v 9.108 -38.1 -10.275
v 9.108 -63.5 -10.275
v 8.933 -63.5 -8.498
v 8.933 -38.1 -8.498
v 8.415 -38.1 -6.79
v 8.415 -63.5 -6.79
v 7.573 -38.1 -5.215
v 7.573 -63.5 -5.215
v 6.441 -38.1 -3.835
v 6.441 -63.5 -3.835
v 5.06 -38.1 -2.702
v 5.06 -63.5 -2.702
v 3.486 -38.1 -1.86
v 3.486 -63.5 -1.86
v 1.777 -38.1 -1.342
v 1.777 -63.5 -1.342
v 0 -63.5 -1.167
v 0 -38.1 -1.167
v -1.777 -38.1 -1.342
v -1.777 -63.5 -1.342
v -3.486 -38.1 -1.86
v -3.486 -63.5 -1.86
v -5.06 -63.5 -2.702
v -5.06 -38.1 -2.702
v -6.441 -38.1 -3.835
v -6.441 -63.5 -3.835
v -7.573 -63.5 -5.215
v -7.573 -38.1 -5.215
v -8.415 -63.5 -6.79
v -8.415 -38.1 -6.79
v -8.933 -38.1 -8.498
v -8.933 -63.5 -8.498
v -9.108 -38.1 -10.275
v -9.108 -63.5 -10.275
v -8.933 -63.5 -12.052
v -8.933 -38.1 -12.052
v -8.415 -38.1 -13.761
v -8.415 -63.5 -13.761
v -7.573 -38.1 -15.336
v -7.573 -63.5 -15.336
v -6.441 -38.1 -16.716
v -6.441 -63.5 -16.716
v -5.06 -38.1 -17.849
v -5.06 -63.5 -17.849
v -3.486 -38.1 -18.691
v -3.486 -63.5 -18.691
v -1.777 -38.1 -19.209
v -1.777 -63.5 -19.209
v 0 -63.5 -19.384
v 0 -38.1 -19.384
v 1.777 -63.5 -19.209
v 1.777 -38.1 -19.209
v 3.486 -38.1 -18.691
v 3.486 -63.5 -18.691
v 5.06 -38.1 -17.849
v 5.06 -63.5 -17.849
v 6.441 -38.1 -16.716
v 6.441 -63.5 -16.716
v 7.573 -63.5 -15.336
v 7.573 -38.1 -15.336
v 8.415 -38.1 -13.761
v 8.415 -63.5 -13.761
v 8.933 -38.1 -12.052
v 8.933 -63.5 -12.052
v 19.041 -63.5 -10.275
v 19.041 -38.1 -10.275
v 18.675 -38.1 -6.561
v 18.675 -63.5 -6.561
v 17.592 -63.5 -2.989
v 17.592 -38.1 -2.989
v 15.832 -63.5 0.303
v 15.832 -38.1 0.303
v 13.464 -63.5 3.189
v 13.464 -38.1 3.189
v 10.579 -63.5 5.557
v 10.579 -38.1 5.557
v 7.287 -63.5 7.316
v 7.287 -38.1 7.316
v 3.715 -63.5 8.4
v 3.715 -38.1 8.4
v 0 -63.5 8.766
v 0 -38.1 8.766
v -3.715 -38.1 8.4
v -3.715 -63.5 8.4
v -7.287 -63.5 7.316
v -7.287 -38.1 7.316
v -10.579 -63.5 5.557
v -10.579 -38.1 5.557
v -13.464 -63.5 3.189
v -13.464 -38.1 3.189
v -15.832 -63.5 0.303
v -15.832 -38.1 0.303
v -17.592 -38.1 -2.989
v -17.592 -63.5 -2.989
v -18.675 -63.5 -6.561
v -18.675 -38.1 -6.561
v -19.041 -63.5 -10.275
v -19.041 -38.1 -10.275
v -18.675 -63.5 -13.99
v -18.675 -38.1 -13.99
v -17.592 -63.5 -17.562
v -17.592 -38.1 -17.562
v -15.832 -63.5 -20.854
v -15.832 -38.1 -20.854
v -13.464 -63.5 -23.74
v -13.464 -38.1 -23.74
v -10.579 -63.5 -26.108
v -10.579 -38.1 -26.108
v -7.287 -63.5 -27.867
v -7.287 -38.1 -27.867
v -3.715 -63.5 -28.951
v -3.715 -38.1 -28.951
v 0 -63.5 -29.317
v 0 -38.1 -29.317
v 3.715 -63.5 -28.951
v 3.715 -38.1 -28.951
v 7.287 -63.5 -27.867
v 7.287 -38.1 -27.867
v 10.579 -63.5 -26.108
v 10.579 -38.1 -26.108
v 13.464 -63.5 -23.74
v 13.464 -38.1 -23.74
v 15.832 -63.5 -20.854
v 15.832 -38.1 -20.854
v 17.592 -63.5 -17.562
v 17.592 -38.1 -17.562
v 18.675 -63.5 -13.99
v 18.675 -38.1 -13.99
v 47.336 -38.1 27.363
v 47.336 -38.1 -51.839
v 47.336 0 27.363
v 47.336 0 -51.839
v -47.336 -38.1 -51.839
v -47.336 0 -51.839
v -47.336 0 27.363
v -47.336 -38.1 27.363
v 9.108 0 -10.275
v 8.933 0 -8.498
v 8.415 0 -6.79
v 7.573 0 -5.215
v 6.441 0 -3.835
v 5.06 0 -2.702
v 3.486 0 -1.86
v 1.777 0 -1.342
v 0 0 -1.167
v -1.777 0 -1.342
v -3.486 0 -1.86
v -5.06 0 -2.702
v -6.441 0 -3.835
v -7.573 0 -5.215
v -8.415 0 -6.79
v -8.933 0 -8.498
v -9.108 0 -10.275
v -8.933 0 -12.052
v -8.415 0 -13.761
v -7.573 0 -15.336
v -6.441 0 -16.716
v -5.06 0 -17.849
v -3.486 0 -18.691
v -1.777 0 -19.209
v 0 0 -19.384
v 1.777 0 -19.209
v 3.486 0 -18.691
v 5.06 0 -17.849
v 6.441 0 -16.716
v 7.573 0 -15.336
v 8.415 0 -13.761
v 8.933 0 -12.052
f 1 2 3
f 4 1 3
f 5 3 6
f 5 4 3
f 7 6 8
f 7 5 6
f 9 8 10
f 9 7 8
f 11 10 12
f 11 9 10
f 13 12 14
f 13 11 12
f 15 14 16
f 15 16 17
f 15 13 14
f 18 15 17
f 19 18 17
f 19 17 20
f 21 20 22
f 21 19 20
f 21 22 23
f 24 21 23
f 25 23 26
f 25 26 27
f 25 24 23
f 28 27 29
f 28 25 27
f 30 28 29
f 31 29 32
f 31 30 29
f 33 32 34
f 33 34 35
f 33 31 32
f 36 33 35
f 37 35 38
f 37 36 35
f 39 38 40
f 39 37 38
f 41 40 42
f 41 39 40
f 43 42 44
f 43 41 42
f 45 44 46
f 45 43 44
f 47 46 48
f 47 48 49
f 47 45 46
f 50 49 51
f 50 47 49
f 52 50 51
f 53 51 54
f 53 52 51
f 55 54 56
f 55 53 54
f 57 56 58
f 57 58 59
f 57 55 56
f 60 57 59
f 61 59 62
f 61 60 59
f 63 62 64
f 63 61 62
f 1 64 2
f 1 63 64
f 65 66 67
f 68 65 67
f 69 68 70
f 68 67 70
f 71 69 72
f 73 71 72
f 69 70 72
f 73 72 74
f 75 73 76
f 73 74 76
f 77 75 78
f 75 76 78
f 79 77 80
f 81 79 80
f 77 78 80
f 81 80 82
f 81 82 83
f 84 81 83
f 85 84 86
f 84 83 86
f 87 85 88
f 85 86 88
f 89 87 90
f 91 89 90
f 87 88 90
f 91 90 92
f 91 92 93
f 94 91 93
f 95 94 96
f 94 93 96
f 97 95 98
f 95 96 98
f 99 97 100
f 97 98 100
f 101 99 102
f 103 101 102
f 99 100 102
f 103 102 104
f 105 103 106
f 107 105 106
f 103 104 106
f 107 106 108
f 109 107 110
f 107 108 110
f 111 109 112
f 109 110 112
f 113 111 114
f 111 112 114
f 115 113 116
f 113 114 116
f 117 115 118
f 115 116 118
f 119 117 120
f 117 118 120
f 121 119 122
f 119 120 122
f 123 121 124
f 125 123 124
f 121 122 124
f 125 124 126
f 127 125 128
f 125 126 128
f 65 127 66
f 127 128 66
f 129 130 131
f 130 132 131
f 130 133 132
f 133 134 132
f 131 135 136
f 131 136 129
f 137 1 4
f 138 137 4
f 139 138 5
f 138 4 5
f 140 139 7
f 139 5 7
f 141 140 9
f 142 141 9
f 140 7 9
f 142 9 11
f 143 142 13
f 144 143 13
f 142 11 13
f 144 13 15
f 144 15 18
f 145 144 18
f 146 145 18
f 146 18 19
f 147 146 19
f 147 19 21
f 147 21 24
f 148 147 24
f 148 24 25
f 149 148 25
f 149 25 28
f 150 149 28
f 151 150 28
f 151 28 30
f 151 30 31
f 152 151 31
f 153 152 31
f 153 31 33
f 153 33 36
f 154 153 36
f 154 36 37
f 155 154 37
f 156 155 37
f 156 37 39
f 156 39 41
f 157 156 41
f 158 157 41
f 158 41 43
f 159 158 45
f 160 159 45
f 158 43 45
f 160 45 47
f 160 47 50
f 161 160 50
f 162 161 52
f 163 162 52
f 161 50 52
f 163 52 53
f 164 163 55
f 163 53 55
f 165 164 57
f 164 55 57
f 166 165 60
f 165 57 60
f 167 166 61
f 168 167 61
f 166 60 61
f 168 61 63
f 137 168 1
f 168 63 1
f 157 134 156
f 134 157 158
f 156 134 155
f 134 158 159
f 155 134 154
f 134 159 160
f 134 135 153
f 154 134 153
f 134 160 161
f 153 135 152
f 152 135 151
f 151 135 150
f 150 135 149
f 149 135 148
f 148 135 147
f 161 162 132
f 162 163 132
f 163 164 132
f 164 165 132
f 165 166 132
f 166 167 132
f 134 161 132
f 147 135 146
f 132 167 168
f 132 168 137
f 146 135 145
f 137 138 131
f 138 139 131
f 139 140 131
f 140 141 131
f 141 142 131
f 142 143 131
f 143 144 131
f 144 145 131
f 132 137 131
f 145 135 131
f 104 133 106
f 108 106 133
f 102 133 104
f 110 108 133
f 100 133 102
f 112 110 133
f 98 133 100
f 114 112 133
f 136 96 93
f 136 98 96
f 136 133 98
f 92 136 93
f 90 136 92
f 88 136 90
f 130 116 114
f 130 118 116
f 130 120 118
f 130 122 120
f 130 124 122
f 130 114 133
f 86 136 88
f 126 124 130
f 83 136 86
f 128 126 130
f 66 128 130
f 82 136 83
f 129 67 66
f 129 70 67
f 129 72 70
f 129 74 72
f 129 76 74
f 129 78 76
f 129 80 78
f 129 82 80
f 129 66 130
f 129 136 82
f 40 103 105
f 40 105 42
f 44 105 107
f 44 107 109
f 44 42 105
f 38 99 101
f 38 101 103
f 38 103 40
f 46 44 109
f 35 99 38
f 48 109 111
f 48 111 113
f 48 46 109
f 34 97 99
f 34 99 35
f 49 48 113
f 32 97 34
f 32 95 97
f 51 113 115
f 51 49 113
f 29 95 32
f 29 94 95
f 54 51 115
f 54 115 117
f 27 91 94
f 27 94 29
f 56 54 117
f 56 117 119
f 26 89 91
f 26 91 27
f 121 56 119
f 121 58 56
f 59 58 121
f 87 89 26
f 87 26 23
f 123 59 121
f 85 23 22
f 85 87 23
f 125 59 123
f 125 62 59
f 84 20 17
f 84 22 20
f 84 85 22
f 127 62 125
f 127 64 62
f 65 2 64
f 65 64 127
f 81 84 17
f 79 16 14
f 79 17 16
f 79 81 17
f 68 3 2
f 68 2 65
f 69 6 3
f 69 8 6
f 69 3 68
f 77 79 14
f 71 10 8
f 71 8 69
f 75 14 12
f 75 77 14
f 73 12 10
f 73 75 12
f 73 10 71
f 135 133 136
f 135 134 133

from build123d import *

# Parameters (mm, degrees)
F0_W     = 94.6727246046
F0_H     = 79.2018212378
F1_DEPTH = 12.7
F2_DEPTH = 25.4
F3_R     = 19.041251915
F3_R_2   = 9.1084784232
F4_DEPTH = 25.4
F5_DEPTH = 38.101


with BuildPart() as f1:
    # F0 (on Front) → F1 (new body)
    with BuildSketch(Plane.XZ):
        with Locations((0, -12.2381839901)):
            Rectangle(F0_W, F0_H)
    extrude(amount=F1_DEPTH)

    # F2 (add): a face of the model
    f2_faces = [f1.faces().sort_by_distance(p)[0] for p in [
        (0, -12.7, -12.2381839901),
    ]]
    extrude(f2_faces, amount=F2_DEPTH)

    # F3 (on face) → F4 (join)
    with BuildSketch(Plane.XZ.offset(38.1)):
        with Locations((0, -10.2754551917)):
            Circle(F3_R)
        with Locations((0, -10.2754551917)):
            Circle(F3_R_2, mode=Mode.SUBTRACT)
    extrude(amount=F4_DEPTH)

    # F5 (cut, through all): a face of the model
    f5_faces = [f1.faces().sort_by_distance(p)[0] for p in [
        (0, -38.1, -10.2754551917),
    ]]
    extrude(f5_faces, amount=-F5_DEPTH, mode=Mode.SUBTRACT)


solid = f1.part
